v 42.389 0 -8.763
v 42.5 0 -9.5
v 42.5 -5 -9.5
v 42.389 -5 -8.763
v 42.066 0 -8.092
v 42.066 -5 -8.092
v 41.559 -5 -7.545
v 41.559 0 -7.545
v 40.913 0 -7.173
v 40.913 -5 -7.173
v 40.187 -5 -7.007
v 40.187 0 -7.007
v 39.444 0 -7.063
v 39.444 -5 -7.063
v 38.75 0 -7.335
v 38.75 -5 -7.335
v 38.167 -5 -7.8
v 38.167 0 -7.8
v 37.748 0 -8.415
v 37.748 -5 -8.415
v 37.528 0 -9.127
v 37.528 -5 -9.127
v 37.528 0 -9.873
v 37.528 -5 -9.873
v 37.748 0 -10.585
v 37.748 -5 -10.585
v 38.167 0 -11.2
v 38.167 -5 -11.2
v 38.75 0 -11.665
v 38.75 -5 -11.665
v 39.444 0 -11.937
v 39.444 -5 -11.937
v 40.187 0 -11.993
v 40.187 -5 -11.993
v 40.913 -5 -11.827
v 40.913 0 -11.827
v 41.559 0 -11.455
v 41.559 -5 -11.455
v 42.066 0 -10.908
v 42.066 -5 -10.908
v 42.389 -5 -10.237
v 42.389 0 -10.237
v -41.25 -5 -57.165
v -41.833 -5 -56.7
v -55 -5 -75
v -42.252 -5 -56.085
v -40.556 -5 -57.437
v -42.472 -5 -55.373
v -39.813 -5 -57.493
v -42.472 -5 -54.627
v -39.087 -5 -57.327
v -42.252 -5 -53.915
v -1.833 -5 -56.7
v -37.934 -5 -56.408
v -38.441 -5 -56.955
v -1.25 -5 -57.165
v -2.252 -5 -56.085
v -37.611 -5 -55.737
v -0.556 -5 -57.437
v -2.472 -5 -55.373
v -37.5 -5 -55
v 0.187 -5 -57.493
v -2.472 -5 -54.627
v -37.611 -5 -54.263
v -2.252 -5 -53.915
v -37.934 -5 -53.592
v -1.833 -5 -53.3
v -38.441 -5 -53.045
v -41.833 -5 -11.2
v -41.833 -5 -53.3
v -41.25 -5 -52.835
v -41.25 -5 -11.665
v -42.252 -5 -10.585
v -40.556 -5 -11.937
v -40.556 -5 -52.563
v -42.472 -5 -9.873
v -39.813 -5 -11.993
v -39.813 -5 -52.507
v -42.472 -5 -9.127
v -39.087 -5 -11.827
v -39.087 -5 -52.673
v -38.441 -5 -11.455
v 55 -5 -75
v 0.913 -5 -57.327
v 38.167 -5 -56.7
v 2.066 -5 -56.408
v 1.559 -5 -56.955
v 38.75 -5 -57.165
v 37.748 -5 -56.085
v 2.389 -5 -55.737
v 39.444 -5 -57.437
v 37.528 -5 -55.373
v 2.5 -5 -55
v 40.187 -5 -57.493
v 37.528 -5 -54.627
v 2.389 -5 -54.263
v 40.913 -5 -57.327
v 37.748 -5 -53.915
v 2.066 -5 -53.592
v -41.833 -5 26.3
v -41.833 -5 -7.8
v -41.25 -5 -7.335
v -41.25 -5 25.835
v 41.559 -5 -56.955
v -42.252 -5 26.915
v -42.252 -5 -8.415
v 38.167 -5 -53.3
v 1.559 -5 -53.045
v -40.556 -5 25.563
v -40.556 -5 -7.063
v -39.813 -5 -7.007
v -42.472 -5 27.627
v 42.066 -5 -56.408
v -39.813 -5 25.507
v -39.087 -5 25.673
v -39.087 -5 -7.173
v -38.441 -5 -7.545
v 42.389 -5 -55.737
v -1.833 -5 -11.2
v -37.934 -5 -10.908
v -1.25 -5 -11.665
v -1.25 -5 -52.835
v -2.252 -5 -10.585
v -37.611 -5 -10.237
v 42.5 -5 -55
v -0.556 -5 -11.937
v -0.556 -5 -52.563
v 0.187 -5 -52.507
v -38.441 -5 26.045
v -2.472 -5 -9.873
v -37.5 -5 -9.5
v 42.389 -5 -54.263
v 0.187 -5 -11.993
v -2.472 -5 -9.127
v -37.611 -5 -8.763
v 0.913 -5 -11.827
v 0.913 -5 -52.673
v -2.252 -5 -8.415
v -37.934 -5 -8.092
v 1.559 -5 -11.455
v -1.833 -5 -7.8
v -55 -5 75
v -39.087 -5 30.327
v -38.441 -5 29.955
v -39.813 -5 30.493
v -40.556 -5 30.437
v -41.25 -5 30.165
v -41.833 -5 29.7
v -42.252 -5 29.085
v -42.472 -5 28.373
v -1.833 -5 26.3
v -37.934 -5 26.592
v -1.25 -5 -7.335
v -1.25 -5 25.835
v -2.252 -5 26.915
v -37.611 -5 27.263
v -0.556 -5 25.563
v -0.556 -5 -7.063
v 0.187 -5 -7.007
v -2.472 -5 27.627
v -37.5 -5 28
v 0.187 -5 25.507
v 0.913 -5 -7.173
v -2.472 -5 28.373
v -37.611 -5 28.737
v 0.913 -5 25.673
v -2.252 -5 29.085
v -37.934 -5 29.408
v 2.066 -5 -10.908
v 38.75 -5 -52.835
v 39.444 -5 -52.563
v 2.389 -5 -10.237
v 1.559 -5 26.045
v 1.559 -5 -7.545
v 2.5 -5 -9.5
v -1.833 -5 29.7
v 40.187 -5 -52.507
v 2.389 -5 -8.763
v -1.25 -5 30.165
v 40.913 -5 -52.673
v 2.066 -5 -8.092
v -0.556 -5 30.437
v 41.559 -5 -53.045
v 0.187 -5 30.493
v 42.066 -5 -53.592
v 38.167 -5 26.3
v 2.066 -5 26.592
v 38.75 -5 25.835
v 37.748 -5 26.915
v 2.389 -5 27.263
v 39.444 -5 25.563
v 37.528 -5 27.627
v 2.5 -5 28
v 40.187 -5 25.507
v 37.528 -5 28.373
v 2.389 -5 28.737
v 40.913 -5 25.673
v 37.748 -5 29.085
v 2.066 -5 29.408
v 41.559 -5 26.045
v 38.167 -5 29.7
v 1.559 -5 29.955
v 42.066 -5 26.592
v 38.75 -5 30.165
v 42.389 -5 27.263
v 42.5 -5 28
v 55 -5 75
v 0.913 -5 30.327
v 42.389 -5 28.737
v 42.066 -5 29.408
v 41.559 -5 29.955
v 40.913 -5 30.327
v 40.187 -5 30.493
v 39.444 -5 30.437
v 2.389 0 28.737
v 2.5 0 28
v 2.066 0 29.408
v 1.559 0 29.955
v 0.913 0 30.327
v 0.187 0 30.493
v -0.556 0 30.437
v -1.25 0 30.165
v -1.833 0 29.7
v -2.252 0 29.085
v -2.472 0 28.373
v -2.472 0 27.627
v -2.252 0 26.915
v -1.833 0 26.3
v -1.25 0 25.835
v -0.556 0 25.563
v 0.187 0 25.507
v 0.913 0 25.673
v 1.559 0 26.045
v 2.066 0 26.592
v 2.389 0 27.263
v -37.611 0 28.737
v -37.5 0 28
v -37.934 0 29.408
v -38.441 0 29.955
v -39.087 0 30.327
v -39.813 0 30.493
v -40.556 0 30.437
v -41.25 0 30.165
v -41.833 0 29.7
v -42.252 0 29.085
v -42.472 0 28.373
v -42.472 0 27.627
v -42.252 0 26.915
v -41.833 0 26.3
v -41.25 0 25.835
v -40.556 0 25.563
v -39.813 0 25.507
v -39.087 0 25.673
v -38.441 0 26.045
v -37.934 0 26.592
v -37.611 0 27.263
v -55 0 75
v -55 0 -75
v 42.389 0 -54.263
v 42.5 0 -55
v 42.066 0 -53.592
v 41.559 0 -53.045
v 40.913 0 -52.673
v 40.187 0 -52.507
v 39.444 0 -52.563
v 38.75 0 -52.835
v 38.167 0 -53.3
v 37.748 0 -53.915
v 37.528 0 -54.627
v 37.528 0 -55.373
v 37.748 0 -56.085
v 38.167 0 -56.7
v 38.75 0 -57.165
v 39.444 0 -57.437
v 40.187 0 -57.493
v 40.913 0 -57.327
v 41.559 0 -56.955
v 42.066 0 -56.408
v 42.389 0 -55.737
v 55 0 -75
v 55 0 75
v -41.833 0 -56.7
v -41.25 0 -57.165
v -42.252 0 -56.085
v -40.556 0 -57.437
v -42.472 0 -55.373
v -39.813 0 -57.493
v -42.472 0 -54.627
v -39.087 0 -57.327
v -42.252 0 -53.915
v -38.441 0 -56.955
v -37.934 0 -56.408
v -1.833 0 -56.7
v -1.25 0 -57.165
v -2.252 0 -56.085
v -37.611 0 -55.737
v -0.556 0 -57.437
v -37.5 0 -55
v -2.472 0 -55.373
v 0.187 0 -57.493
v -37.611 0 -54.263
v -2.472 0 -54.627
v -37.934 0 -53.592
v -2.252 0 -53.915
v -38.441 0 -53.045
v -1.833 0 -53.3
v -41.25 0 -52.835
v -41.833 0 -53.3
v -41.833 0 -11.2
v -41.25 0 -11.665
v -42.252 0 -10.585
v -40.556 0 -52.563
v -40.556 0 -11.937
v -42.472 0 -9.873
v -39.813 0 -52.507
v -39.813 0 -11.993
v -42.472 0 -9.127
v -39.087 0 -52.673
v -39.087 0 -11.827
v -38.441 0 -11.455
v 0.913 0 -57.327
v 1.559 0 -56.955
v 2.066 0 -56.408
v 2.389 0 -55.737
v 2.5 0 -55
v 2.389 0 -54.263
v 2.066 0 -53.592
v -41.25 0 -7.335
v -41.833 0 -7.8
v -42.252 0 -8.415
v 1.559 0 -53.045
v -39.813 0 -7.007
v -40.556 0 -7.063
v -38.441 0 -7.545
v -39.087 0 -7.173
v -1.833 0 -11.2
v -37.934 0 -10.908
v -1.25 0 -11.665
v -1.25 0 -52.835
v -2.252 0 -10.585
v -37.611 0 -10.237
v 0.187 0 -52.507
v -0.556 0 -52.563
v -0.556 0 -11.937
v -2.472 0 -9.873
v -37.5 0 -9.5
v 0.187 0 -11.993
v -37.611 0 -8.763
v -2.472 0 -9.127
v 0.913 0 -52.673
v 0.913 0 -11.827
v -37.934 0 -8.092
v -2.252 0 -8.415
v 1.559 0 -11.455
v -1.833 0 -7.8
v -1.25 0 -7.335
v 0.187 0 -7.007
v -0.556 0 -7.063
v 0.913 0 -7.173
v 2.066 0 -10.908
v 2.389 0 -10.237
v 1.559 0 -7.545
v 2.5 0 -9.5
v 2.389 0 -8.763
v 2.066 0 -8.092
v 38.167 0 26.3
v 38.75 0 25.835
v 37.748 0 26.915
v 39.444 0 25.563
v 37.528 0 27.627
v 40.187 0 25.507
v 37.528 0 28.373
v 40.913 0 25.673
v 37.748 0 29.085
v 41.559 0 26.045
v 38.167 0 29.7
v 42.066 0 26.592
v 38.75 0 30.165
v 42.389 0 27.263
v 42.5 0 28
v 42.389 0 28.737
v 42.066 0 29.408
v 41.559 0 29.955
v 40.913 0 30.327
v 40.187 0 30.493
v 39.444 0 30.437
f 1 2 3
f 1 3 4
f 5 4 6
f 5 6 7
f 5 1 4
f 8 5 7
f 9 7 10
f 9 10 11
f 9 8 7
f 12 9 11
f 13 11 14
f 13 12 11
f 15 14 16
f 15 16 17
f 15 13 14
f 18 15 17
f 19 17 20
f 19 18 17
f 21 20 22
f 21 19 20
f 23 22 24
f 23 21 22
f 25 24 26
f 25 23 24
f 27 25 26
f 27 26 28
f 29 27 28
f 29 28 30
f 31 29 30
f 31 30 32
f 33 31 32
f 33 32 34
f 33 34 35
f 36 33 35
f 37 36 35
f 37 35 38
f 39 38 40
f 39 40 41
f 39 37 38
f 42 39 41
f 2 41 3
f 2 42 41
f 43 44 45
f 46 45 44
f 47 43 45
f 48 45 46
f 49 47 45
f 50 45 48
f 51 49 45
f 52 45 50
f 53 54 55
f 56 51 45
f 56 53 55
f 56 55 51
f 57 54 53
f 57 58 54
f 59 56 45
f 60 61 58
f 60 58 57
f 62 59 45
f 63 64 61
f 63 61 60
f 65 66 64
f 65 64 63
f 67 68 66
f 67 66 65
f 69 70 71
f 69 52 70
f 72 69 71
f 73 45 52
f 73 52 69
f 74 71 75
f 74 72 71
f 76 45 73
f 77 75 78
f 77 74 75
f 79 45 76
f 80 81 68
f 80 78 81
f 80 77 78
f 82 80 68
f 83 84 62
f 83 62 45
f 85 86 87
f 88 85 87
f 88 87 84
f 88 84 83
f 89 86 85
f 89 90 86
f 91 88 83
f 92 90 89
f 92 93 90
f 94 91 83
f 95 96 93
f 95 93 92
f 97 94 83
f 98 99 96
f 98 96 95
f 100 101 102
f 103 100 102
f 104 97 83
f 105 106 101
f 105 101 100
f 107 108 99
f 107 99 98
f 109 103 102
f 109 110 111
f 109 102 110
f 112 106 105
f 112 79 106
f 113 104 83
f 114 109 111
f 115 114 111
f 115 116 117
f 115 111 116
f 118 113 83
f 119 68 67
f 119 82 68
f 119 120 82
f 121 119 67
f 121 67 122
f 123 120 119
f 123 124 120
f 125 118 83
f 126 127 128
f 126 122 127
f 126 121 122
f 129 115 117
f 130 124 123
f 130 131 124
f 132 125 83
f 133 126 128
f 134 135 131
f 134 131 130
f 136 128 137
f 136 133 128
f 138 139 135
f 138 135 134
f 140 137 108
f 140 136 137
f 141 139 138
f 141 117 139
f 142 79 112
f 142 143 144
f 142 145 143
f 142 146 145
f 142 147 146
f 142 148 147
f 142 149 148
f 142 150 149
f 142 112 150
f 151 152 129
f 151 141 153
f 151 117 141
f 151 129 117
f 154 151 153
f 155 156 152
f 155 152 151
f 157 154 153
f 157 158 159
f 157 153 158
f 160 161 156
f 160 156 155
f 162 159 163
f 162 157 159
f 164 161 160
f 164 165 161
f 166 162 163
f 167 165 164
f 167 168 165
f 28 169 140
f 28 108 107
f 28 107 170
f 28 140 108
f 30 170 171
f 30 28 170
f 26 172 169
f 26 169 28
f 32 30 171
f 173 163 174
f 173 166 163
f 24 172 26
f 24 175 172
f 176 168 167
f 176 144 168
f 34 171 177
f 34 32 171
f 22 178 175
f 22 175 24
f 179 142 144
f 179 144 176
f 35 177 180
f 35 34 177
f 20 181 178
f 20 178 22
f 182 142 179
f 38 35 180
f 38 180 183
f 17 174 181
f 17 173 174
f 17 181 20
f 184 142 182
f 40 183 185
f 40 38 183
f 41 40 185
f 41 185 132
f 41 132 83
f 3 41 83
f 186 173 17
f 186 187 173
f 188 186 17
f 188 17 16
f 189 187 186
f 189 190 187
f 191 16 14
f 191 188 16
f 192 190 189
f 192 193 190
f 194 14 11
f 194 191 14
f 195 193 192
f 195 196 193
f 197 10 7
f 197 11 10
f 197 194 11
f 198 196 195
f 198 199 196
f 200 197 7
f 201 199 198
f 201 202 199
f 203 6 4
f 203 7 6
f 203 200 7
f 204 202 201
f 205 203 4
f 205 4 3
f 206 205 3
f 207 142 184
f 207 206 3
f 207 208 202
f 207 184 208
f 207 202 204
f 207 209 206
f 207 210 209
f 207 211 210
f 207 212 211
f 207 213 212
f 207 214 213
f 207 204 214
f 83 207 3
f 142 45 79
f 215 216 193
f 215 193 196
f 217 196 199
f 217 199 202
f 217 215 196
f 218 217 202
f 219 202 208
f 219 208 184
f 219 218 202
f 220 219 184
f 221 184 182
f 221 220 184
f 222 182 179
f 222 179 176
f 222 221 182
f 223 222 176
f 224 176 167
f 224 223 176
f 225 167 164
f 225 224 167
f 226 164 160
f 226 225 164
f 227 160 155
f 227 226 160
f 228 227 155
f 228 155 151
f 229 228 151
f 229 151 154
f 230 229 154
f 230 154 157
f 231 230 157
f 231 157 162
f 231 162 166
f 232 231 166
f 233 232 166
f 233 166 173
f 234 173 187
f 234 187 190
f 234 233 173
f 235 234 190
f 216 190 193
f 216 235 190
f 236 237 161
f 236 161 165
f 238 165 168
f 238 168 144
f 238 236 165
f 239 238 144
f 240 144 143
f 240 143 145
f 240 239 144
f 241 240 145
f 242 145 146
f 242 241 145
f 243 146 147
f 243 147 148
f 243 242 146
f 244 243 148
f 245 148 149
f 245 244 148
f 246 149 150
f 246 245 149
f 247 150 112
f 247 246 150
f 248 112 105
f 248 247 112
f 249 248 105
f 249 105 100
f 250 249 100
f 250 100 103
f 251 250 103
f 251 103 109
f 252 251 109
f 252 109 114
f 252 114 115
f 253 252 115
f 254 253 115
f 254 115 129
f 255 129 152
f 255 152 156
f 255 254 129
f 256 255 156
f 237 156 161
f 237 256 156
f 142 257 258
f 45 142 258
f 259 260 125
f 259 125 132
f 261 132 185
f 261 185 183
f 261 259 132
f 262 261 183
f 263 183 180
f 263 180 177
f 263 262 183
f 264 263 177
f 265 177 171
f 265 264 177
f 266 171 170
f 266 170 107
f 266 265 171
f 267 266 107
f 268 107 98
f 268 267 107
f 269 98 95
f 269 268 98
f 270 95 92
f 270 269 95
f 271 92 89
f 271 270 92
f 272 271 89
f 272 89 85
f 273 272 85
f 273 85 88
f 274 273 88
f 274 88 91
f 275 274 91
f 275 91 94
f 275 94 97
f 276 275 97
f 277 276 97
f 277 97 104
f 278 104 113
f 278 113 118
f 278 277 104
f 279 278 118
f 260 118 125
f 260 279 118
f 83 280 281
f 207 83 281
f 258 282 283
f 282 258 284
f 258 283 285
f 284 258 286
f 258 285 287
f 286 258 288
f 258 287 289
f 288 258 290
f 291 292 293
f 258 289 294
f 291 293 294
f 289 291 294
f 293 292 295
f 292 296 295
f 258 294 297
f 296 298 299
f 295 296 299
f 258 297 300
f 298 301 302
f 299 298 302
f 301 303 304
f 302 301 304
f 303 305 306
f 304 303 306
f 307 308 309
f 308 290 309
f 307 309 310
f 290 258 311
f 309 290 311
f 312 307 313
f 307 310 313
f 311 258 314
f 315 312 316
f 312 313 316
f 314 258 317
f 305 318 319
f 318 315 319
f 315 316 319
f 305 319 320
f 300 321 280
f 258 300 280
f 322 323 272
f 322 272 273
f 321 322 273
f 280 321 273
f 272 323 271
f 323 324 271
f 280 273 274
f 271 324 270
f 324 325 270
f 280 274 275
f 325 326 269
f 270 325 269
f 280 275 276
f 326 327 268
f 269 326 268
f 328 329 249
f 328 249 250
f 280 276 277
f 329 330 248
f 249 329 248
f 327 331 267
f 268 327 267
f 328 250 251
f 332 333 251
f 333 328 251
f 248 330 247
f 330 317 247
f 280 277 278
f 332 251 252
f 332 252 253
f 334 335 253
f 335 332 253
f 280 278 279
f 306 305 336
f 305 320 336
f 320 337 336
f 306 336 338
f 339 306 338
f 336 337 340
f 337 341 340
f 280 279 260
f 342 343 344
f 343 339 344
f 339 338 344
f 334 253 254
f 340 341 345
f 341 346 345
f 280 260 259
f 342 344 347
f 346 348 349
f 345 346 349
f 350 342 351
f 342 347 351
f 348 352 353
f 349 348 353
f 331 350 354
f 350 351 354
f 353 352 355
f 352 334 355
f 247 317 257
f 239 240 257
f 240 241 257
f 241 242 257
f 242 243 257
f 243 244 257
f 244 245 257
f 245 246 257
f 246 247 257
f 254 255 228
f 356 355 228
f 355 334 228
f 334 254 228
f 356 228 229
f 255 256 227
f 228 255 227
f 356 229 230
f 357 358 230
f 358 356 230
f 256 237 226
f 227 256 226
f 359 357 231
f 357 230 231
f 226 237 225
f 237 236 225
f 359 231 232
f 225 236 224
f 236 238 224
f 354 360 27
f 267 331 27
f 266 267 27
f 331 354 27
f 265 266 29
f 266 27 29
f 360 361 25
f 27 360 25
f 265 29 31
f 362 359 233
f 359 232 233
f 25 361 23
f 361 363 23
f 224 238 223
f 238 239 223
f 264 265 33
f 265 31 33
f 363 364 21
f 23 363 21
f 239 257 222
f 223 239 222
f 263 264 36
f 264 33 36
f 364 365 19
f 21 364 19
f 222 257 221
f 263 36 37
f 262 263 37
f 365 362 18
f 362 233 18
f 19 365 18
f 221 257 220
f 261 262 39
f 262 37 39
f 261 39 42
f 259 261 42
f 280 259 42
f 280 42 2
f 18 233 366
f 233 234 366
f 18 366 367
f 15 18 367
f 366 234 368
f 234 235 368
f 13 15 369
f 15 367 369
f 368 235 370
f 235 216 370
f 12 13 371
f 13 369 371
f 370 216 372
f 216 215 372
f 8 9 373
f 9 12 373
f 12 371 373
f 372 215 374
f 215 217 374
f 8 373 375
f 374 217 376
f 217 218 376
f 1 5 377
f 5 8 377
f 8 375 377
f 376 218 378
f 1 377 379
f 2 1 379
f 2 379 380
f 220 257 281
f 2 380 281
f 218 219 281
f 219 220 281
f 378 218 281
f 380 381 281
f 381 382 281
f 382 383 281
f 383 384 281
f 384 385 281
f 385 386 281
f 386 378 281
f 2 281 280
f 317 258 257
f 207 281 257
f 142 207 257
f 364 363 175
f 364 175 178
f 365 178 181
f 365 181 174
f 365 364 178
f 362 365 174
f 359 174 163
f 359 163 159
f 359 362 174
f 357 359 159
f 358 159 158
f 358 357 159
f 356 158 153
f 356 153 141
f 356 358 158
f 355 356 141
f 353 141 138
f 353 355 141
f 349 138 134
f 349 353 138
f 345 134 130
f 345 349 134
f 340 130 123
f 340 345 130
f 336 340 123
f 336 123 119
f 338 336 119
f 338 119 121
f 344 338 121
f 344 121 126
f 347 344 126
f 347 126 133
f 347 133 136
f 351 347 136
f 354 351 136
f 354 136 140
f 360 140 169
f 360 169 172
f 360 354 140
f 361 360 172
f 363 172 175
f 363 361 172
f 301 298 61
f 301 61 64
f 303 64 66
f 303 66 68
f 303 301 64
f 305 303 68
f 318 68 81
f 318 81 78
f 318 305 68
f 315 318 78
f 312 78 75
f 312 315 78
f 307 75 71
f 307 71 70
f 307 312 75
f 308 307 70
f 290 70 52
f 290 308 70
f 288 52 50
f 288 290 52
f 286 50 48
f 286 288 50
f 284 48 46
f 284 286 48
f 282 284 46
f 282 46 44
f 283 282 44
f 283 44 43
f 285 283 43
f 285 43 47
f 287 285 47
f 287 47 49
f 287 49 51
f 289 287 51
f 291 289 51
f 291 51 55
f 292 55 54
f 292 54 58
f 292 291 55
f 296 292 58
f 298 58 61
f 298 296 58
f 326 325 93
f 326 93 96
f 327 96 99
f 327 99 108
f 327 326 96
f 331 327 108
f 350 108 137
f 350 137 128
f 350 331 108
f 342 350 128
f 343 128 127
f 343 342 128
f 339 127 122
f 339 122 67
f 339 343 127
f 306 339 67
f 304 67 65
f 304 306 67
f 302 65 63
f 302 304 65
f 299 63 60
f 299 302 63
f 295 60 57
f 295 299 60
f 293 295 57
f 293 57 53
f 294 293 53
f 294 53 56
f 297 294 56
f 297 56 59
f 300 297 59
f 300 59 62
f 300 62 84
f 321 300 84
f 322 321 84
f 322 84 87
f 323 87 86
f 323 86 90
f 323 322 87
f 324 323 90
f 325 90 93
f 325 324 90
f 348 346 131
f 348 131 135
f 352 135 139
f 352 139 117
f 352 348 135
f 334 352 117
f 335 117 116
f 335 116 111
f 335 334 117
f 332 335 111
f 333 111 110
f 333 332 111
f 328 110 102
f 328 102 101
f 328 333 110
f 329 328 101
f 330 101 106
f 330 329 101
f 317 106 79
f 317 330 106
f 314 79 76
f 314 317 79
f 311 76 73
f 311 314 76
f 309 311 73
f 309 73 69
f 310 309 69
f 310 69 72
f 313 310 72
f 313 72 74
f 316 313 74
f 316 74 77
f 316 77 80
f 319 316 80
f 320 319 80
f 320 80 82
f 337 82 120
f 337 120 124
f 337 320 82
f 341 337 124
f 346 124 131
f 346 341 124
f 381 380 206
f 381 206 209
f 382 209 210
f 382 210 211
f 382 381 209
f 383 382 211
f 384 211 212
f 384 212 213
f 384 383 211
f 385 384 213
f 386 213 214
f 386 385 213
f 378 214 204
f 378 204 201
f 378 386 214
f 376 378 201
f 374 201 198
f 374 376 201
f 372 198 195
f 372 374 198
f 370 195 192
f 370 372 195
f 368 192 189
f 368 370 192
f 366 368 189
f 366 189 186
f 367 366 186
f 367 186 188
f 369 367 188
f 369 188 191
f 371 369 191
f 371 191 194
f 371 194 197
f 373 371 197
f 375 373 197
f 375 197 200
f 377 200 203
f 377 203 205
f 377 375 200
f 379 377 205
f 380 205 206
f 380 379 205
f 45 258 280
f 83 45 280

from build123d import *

# Parameters (mm, degrees)
F0_R     = 2.5
F1_DEPTH = 5


with BuildPart() as f1:
    # F0 (on Front) → F1 (new body)
    with BuildSketch(Plane.XZ):
        Polygon((-55, -75), (55, -75), (55, 75), (0, 75), (-55, 75), (-55, 38.300177), align=None)
        with Locations((-40, -55)):
            Circle(F0_R, mode=Mode.SUBTRACT)
        with Locations((-40, -9.5)):
            Circle(F0_R, mode=Mode.SUBTRACT)
        with Locations((0, -55)):
            Circle(F0_R, mode=Mode.SUBTRACT)
        with Locations((40, -55)):
            Circle(F0_R, mode=Mode.SUBTRACT)
        with Locations((0, -9.5)):
            Circle(F0_R, mode=Mode.SUBTRACT)
        with Locations((40, -9.5)):
            Circle(F0_R, mode=Mode.SUBTRACT)
        with Locations((-40, 28)):
            Circle(F0_R, mode=Mode.SUBTRACT)
        with Locations((0, 28)):
            Circle(F0_R, mode=Mode.SUBTRACT)
        with Locations((40, 28)):
            Circle(F0_R, mode=Mode.SUBTRACT)
    extrude(amount=F1_DEPTH)


solid = f1.part
